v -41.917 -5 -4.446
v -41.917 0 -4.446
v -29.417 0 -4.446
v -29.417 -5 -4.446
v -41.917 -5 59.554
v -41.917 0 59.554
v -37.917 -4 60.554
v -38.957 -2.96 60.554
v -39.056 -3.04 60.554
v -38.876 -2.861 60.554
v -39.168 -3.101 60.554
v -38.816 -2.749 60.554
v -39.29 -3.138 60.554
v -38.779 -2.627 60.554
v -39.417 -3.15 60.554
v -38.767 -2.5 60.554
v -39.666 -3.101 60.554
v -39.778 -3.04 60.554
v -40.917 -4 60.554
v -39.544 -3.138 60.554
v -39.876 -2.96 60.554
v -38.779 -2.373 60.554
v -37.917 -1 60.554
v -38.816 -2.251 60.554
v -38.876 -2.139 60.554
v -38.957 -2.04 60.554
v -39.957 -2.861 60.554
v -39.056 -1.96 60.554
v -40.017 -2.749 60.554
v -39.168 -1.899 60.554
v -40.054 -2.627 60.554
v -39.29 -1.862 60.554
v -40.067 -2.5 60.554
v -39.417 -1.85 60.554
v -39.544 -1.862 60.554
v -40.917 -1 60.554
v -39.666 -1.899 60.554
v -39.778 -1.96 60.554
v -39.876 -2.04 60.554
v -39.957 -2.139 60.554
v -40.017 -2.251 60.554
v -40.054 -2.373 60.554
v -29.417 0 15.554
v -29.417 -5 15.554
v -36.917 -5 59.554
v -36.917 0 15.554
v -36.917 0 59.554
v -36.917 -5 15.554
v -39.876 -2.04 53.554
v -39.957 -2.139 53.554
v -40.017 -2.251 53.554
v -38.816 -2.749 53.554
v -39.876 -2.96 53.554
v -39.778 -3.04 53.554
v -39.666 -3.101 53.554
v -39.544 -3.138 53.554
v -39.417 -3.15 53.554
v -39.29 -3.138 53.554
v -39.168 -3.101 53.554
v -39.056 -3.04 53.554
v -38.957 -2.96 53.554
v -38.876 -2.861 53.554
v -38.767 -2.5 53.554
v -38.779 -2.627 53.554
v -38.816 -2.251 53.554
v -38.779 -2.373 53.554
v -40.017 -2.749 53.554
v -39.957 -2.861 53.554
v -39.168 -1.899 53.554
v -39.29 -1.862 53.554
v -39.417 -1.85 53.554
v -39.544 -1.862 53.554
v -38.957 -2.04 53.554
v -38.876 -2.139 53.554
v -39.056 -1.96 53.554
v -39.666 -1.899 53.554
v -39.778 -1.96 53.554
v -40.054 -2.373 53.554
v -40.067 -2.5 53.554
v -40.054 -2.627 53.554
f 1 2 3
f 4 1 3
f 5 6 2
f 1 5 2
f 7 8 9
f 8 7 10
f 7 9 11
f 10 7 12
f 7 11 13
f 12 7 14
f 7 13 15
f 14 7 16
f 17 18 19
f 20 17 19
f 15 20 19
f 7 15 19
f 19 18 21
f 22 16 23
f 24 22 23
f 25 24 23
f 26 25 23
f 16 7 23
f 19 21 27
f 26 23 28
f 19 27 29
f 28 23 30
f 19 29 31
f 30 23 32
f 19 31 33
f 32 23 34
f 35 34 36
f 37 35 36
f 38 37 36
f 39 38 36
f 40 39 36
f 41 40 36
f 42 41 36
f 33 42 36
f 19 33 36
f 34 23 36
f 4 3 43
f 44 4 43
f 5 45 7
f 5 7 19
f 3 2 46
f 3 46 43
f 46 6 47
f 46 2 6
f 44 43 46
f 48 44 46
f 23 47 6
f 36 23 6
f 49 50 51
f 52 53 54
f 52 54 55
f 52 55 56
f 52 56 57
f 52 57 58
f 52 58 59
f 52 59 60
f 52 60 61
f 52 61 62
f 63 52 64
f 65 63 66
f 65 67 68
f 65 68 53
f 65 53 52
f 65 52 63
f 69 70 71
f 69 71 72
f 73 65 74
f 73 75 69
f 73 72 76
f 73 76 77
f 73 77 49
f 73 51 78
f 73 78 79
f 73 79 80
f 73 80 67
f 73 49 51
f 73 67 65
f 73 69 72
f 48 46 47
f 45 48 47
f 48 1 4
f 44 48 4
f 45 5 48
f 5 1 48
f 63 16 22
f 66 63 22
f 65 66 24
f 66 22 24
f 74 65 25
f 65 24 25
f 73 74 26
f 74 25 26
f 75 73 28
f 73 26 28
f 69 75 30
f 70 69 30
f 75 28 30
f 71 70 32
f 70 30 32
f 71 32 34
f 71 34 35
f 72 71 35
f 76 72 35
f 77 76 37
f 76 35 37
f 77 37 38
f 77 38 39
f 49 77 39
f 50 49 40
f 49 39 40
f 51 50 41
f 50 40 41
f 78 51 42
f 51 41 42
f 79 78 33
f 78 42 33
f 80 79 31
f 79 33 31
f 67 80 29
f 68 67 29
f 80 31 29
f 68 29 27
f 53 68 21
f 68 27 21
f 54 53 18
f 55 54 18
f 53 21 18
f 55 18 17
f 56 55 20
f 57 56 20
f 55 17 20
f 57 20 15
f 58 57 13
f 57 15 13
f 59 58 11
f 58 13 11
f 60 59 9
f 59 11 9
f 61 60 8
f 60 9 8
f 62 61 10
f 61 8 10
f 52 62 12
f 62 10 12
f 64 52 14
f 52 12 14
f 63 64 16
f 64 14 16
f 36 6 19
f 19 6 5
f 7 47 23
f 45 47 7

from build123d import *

# Parameters (mm, degrees)
F1_DEPTH = 5
F2_R     = 0.65
F3_DEPTH = 7
F4_SIZE  = 1


with BuildPart() as f1:
    # F0 (on Front) → F1 (new body)
    with BuildSketch(Plane.XZ):
        Polygon((-36.916861, 60.554342), (-41.916861, 60.554342), (-41.916861, -4.445658), (-36.916861, -4.445658), (-29.416861, -4.445658), (-29.416861, 15.554342), (-36.916861, 15.554342), align=None)
    extrude(amount=F1_DEPTH)

    # F2 (on face) → F3 (cut)
    with BuildSketch(Plane.XY.offset(60.554342)):
        with Locations((-39.416861, -2.5)):
            Circle(F2_R)
    extrude(amount=-F3_DEPTH, mode=Mode.SUBTRACT)

    # F4
    f4_edges = [f1.edges().sort_by_distance(p)[0] for p in [
        (-36.916861, -2.5, 60.554342),
        (-39.416861, -5, 60.554342),
        (-39.416861, 0, 60.554342),
        (-41.916861, -2.5, 60.554342),
    ]]
    chamfer(f4_edges, length=F4_SIZE)


solid = f1.part
